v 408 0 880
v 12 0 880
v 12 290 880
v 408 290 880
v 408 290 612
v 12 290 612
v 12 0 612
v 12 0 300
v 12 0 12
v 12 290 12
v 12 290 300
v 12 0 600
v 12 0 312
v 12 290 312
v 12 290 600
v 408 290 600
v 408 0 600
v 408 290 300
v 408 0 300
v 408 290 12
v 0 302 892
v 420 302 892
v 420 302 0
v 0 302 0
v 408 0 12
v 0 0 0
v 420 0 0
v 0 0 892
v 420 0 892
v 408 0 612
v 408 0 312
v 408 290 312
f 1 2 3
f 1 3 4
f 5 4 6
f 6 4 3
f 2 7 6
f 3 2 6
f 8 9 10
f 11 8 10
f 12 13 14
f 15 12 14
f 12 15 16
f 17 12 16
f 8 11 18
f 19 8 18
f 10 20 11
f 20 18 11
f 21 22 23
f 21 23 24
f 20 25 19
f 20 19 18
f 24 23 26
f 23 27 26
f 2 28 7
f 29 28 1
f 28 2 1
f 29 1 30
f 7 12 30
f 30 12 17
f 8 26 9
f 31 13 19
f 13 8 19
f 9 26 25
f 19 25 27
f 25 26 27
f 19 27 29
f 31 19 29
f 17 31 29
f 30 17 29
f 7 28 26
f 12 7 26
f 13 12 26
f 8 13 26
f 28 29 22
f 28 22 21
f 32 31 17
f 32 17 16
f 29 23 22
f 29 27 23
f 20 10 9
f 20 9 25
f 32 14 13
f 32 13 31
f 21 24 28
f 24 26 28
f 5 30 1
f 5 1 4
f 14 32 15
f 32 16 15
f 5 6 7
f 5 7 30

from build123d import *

# Parameters (mm, degrees)
F0_W      = 420
F0_H      = 290
F1_DEPTH  = 12
F2_W      = 12
F2_H      = 290
F3_DEPTH  = 880
F7_W      = 420
F7_H      = 290
F8_DEPTH  = 12
F9_W      = 420
F9_H      = 290
F10_DEPTH = 12
F13_W     = 420
F13_H     = 290
F14_DEPTH = 12
F15_W     = 420
F15_H     = 892
F16_DEPTH = 12


with BuildPart() as f1:
    # F0 (on Top) → F1 (new body)
    with BuildSketch(Plane.XY):
        with Locations((210, 145)):
            Rectangle(F0_W, F0_H)
    extrude(amount=F1_DEPTH)

    # F2 (on face) → F3 (join)
    with BuildSketch(Plane.XY.offset(12)):
        with Locations((6, 145)):
            Rectangle(F2_W, F2_H)
        with Locations((414, 145)):
            Rectangle(F2_W, F2_H)
    extrude(amount=F3_DEPTH)

    # F7 (on offset) → F8 (join)
    with BuildSketch(Plane.XY.offset(300)):
        with Locations((210, 145)):
            Rectangle(F7_W, F7_H)
    extrude(amount=F8_DEPTH)

    # F9 (on offset) → F10 (join)
    with BuildSketch(Plane.XY.offset(600)):
        with Locations((210, 145)):
            Rectangle(F9_W, F9_H)
    extrude(amount=F10_DEPTH)

    # F13 (on 3pt) → F14 (join)
    with BuildSketch(Plane(origin=(0, 0, 892), x_dir=(1, 0, 0), z_dir=(0, 0, -1))):
        with Locations((210, -145)):
            Rectangle(F13_W, F13_H)
    extrude(amount=F14_DEPTH)

    # F15 (on face) → F16 (join)
    with BuildSketch(Plane(origin=(0, 290, 0), x_dir=(-1, 0, 0), z_dir=(0, 1, 0))):
        with Locations((-210, 446)):
            Rectangle(F15_W, F15_H)
    extrude(amount=F16_DEPTH)


solid = f1.part
